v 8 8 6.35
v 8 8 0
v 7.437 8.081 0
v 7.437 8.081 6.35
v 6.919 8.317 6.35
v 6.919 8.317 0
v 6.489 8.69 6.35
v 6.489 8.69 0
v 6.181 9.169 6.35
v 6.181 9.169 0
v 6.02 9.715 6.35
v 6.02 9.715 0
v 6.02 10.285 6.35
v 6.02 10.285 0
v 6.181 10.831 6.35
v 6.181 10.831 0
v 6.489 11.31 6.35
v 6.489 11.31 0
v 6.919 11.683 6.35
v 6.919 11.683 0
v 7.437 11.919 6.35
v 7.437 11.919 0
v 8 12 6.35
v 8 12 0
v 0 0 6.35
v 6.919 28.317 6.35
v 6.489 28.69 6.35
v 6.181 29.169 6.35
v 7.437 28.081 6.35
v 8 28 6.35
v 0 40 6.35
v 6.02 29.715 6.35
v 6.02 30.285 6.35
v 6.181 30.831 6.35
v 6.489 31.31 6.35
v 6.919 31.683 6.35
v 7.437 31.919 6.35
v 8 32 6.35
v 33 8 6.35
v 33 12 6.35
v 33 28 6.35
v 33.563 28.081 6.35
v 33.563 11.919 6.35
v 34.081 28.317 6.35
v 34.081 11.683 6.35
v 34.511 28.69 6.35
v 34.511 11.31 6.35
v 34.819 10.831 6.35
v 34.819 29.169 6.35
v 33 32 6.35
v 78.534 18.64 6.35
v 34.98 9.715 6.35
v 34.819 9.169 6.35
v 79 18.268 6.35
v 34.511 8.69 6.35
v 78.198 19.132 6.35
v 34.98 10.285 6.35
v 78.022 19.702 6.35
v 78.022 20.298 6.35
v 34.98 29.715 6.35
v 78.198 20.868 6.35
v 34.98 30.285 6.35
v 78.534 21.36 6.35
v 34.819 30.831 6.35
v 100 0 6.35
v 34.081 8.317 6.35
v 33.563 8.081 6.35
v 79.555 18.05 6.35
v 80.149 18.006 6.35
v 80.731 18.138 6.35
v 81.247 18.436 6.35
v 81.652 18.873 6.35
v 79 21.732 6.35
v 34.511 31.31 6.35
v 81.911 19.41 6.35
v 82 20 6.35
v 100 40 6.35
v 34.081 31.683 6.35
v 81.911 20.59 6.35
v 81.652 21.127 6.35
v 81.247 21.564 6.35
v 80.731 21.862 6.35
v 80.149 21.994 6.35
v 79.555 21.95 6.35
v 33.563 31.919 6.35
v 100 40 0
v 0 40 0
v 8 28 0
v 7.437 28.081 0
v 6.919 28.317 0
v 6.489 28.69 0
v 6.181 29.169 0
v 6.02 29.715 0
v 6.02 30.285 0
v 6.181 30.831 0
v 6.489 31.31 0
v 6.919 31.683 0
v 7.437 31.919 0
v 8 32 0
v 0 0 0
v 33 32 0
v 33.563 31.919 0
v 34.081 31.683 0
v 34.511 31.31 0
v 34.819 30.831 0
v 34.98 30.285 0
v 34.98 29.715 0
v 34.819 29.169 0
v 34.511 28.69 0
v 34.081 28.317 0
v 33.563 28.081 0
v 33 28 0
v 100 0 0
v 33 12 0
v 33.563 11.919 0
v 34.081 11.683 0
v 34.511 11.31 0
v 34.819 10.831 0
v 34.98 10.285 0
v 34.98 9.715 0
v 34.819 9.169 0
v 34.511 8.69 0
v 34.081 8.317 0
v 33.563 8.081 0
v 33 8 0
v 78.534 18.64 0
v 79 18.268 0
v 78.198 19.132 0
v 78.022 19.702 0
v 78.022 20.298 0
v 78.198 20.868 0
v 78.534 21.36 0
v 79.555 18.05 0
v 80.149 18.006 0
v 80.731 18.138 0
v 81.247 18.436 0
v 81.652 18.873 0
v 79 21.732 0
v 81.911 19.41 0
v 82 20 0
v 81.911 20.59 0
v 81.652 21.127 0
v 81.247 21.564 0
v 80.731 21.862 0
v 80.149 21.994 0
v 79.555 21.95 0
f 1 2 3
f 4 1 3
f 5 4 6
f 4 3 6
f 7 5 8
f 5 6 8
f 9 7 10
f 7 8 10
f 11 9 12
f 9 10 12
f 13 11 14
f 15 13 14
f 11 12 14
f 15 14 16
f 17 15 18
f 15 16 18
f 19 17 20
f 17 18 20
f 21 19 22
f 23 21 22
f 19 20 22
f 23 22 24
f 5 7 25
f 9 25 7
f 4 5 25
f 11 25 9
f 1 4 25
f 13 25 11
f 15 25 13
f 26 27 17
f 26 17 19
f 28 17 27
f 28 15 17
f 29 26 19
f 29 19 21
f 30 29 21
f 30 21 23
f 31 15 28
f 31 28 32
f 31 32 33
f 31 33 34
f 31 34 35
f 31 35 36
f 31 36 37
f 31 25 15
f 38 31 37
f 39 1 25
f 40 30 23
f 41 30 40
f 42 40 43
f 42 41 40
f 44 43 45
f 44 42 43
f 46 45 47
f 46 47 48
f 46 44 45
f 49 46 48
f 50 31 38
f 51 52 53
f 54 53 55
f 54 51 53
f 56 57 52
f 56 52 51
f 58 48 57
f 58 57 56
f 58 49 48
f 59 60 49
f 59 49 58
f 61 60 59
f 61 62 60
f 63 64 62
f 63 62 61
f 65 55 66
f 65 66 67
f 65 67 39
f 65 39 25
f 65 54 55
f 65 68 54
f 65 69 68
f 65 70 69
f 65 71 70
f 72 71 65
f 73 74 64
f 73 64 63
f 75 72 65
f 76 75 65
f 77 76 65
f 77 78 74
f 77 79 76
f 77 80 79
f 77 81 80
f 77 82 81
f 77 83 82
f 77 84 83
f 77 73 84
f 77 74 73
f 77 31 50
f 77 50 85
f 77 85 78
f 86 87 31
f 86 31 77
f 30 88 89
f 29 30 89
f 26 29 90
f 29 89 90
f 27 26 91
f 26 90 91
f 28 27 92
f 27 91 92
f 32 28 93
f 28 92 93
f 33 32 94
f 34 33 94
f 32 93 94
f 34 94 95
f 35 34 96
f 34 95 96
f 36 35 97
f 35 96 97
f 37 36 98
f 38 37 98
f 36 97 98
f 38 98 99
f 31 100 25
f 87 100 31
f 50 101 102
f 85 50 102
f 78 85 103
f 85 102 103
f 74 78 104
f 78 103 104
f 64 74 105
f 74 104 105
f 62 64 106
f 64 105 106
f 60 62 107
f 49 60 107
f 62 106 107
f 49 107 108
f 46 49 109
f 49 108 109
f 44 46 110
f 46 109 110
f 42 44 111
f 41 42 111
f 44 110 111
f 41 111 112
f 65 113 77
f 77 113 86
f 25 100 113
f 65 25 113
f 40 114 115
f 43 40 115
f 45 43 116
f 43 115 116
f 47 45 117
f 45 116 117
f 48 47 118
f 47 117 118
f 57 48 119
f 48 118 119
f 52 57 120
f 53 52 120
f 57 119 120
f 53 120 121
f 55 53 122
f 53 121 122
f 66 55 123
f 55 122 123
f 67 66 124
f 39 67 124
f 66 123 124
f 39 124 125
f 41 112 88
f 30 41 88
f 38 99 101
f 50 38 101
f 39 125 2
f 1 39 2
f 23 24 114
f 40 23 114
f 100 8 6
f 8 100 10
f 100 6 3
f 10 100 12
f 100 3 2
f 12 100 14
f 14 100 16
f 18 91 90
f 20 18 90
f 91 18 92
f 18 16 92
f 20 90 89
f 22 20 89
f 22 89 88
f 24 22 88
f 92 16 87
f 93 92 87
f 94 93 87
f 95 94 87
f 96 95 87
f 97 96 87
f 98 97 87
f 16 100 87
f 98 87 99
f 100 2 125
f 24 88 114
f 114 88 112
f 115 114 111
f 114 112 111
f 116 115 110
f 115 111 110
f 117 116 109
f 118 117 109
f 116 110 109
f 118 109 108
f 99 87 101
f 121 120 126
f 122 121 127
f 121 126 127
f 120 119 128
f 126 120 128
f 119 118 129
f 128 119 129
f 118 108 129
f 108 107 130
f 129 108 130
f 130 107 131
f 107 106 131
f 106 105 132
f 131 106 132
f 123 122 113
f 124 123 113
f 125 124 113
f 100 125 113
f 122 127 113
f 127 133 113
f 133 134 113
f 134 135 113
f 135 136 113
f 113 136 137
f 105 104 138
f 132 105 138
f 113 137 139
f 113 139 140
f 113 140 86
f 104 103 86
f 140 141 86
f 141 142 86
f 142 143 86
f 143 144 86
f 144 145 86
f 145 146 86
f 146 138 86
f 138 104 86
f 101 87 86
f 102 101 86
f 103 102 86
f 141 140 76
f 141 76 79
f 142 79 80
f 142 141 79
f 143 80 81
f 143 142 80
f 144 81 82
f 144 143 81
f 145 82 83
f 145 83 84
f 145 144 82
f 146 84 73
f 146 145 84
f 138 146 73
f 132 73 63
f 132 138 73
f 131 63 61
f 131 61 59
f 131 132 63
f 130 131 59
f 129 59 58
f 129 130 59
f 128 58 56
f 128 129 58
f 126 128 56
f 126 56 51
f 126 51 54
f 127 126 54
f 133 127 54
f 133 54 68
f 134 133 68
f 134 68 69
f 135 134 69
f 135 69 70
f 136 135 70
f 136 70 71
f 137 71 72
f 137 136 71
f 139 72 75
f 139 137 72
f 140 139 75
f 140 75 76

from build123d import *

# Parameters (mm, degrees)
SKETCH1_W           = 100
SKETCH1_H           = 40
SKETCH1_R           = 2
BOSS_EXTRUDE1_DEPTH = 6.35


with BuildPart() as part:
    # Sketch1 → Boss-Extrude1 (new body)
    with BuildSketch(Plane.XY):
        with Locations((50, 20)):
            Rectangle(SKETCH1_W, SKETCH1_H)
        with Locations((80, 20)):
            Circle(SKETCH1_R, mode=Mode.SUBTRACT)
        with BuildLine():
            Line((8, 32), (33, 32))
            ThreePointArc((33, 32), (35, 30), (33, 28))
            Line((33, 28), (8, 28))
            ThreePointArc((8, 28), (6, 30), (8, 32))
        make_face(mode=Mode.SUBTRACT)
        with BuildLine():
            Line((8, 12), (33, 12))
            ThreePointArc((33, 12), (35, 10), (33, 8))
            Line((33, 8), (8, 8))
            ThreePointArc((8, 8), (6, 10), (8, 12))
        make_face(mode=Mode.SUBTRACT)
    extrude(amount=BOSS_EXTRUDE1_DEPTH)


solid = part.part
